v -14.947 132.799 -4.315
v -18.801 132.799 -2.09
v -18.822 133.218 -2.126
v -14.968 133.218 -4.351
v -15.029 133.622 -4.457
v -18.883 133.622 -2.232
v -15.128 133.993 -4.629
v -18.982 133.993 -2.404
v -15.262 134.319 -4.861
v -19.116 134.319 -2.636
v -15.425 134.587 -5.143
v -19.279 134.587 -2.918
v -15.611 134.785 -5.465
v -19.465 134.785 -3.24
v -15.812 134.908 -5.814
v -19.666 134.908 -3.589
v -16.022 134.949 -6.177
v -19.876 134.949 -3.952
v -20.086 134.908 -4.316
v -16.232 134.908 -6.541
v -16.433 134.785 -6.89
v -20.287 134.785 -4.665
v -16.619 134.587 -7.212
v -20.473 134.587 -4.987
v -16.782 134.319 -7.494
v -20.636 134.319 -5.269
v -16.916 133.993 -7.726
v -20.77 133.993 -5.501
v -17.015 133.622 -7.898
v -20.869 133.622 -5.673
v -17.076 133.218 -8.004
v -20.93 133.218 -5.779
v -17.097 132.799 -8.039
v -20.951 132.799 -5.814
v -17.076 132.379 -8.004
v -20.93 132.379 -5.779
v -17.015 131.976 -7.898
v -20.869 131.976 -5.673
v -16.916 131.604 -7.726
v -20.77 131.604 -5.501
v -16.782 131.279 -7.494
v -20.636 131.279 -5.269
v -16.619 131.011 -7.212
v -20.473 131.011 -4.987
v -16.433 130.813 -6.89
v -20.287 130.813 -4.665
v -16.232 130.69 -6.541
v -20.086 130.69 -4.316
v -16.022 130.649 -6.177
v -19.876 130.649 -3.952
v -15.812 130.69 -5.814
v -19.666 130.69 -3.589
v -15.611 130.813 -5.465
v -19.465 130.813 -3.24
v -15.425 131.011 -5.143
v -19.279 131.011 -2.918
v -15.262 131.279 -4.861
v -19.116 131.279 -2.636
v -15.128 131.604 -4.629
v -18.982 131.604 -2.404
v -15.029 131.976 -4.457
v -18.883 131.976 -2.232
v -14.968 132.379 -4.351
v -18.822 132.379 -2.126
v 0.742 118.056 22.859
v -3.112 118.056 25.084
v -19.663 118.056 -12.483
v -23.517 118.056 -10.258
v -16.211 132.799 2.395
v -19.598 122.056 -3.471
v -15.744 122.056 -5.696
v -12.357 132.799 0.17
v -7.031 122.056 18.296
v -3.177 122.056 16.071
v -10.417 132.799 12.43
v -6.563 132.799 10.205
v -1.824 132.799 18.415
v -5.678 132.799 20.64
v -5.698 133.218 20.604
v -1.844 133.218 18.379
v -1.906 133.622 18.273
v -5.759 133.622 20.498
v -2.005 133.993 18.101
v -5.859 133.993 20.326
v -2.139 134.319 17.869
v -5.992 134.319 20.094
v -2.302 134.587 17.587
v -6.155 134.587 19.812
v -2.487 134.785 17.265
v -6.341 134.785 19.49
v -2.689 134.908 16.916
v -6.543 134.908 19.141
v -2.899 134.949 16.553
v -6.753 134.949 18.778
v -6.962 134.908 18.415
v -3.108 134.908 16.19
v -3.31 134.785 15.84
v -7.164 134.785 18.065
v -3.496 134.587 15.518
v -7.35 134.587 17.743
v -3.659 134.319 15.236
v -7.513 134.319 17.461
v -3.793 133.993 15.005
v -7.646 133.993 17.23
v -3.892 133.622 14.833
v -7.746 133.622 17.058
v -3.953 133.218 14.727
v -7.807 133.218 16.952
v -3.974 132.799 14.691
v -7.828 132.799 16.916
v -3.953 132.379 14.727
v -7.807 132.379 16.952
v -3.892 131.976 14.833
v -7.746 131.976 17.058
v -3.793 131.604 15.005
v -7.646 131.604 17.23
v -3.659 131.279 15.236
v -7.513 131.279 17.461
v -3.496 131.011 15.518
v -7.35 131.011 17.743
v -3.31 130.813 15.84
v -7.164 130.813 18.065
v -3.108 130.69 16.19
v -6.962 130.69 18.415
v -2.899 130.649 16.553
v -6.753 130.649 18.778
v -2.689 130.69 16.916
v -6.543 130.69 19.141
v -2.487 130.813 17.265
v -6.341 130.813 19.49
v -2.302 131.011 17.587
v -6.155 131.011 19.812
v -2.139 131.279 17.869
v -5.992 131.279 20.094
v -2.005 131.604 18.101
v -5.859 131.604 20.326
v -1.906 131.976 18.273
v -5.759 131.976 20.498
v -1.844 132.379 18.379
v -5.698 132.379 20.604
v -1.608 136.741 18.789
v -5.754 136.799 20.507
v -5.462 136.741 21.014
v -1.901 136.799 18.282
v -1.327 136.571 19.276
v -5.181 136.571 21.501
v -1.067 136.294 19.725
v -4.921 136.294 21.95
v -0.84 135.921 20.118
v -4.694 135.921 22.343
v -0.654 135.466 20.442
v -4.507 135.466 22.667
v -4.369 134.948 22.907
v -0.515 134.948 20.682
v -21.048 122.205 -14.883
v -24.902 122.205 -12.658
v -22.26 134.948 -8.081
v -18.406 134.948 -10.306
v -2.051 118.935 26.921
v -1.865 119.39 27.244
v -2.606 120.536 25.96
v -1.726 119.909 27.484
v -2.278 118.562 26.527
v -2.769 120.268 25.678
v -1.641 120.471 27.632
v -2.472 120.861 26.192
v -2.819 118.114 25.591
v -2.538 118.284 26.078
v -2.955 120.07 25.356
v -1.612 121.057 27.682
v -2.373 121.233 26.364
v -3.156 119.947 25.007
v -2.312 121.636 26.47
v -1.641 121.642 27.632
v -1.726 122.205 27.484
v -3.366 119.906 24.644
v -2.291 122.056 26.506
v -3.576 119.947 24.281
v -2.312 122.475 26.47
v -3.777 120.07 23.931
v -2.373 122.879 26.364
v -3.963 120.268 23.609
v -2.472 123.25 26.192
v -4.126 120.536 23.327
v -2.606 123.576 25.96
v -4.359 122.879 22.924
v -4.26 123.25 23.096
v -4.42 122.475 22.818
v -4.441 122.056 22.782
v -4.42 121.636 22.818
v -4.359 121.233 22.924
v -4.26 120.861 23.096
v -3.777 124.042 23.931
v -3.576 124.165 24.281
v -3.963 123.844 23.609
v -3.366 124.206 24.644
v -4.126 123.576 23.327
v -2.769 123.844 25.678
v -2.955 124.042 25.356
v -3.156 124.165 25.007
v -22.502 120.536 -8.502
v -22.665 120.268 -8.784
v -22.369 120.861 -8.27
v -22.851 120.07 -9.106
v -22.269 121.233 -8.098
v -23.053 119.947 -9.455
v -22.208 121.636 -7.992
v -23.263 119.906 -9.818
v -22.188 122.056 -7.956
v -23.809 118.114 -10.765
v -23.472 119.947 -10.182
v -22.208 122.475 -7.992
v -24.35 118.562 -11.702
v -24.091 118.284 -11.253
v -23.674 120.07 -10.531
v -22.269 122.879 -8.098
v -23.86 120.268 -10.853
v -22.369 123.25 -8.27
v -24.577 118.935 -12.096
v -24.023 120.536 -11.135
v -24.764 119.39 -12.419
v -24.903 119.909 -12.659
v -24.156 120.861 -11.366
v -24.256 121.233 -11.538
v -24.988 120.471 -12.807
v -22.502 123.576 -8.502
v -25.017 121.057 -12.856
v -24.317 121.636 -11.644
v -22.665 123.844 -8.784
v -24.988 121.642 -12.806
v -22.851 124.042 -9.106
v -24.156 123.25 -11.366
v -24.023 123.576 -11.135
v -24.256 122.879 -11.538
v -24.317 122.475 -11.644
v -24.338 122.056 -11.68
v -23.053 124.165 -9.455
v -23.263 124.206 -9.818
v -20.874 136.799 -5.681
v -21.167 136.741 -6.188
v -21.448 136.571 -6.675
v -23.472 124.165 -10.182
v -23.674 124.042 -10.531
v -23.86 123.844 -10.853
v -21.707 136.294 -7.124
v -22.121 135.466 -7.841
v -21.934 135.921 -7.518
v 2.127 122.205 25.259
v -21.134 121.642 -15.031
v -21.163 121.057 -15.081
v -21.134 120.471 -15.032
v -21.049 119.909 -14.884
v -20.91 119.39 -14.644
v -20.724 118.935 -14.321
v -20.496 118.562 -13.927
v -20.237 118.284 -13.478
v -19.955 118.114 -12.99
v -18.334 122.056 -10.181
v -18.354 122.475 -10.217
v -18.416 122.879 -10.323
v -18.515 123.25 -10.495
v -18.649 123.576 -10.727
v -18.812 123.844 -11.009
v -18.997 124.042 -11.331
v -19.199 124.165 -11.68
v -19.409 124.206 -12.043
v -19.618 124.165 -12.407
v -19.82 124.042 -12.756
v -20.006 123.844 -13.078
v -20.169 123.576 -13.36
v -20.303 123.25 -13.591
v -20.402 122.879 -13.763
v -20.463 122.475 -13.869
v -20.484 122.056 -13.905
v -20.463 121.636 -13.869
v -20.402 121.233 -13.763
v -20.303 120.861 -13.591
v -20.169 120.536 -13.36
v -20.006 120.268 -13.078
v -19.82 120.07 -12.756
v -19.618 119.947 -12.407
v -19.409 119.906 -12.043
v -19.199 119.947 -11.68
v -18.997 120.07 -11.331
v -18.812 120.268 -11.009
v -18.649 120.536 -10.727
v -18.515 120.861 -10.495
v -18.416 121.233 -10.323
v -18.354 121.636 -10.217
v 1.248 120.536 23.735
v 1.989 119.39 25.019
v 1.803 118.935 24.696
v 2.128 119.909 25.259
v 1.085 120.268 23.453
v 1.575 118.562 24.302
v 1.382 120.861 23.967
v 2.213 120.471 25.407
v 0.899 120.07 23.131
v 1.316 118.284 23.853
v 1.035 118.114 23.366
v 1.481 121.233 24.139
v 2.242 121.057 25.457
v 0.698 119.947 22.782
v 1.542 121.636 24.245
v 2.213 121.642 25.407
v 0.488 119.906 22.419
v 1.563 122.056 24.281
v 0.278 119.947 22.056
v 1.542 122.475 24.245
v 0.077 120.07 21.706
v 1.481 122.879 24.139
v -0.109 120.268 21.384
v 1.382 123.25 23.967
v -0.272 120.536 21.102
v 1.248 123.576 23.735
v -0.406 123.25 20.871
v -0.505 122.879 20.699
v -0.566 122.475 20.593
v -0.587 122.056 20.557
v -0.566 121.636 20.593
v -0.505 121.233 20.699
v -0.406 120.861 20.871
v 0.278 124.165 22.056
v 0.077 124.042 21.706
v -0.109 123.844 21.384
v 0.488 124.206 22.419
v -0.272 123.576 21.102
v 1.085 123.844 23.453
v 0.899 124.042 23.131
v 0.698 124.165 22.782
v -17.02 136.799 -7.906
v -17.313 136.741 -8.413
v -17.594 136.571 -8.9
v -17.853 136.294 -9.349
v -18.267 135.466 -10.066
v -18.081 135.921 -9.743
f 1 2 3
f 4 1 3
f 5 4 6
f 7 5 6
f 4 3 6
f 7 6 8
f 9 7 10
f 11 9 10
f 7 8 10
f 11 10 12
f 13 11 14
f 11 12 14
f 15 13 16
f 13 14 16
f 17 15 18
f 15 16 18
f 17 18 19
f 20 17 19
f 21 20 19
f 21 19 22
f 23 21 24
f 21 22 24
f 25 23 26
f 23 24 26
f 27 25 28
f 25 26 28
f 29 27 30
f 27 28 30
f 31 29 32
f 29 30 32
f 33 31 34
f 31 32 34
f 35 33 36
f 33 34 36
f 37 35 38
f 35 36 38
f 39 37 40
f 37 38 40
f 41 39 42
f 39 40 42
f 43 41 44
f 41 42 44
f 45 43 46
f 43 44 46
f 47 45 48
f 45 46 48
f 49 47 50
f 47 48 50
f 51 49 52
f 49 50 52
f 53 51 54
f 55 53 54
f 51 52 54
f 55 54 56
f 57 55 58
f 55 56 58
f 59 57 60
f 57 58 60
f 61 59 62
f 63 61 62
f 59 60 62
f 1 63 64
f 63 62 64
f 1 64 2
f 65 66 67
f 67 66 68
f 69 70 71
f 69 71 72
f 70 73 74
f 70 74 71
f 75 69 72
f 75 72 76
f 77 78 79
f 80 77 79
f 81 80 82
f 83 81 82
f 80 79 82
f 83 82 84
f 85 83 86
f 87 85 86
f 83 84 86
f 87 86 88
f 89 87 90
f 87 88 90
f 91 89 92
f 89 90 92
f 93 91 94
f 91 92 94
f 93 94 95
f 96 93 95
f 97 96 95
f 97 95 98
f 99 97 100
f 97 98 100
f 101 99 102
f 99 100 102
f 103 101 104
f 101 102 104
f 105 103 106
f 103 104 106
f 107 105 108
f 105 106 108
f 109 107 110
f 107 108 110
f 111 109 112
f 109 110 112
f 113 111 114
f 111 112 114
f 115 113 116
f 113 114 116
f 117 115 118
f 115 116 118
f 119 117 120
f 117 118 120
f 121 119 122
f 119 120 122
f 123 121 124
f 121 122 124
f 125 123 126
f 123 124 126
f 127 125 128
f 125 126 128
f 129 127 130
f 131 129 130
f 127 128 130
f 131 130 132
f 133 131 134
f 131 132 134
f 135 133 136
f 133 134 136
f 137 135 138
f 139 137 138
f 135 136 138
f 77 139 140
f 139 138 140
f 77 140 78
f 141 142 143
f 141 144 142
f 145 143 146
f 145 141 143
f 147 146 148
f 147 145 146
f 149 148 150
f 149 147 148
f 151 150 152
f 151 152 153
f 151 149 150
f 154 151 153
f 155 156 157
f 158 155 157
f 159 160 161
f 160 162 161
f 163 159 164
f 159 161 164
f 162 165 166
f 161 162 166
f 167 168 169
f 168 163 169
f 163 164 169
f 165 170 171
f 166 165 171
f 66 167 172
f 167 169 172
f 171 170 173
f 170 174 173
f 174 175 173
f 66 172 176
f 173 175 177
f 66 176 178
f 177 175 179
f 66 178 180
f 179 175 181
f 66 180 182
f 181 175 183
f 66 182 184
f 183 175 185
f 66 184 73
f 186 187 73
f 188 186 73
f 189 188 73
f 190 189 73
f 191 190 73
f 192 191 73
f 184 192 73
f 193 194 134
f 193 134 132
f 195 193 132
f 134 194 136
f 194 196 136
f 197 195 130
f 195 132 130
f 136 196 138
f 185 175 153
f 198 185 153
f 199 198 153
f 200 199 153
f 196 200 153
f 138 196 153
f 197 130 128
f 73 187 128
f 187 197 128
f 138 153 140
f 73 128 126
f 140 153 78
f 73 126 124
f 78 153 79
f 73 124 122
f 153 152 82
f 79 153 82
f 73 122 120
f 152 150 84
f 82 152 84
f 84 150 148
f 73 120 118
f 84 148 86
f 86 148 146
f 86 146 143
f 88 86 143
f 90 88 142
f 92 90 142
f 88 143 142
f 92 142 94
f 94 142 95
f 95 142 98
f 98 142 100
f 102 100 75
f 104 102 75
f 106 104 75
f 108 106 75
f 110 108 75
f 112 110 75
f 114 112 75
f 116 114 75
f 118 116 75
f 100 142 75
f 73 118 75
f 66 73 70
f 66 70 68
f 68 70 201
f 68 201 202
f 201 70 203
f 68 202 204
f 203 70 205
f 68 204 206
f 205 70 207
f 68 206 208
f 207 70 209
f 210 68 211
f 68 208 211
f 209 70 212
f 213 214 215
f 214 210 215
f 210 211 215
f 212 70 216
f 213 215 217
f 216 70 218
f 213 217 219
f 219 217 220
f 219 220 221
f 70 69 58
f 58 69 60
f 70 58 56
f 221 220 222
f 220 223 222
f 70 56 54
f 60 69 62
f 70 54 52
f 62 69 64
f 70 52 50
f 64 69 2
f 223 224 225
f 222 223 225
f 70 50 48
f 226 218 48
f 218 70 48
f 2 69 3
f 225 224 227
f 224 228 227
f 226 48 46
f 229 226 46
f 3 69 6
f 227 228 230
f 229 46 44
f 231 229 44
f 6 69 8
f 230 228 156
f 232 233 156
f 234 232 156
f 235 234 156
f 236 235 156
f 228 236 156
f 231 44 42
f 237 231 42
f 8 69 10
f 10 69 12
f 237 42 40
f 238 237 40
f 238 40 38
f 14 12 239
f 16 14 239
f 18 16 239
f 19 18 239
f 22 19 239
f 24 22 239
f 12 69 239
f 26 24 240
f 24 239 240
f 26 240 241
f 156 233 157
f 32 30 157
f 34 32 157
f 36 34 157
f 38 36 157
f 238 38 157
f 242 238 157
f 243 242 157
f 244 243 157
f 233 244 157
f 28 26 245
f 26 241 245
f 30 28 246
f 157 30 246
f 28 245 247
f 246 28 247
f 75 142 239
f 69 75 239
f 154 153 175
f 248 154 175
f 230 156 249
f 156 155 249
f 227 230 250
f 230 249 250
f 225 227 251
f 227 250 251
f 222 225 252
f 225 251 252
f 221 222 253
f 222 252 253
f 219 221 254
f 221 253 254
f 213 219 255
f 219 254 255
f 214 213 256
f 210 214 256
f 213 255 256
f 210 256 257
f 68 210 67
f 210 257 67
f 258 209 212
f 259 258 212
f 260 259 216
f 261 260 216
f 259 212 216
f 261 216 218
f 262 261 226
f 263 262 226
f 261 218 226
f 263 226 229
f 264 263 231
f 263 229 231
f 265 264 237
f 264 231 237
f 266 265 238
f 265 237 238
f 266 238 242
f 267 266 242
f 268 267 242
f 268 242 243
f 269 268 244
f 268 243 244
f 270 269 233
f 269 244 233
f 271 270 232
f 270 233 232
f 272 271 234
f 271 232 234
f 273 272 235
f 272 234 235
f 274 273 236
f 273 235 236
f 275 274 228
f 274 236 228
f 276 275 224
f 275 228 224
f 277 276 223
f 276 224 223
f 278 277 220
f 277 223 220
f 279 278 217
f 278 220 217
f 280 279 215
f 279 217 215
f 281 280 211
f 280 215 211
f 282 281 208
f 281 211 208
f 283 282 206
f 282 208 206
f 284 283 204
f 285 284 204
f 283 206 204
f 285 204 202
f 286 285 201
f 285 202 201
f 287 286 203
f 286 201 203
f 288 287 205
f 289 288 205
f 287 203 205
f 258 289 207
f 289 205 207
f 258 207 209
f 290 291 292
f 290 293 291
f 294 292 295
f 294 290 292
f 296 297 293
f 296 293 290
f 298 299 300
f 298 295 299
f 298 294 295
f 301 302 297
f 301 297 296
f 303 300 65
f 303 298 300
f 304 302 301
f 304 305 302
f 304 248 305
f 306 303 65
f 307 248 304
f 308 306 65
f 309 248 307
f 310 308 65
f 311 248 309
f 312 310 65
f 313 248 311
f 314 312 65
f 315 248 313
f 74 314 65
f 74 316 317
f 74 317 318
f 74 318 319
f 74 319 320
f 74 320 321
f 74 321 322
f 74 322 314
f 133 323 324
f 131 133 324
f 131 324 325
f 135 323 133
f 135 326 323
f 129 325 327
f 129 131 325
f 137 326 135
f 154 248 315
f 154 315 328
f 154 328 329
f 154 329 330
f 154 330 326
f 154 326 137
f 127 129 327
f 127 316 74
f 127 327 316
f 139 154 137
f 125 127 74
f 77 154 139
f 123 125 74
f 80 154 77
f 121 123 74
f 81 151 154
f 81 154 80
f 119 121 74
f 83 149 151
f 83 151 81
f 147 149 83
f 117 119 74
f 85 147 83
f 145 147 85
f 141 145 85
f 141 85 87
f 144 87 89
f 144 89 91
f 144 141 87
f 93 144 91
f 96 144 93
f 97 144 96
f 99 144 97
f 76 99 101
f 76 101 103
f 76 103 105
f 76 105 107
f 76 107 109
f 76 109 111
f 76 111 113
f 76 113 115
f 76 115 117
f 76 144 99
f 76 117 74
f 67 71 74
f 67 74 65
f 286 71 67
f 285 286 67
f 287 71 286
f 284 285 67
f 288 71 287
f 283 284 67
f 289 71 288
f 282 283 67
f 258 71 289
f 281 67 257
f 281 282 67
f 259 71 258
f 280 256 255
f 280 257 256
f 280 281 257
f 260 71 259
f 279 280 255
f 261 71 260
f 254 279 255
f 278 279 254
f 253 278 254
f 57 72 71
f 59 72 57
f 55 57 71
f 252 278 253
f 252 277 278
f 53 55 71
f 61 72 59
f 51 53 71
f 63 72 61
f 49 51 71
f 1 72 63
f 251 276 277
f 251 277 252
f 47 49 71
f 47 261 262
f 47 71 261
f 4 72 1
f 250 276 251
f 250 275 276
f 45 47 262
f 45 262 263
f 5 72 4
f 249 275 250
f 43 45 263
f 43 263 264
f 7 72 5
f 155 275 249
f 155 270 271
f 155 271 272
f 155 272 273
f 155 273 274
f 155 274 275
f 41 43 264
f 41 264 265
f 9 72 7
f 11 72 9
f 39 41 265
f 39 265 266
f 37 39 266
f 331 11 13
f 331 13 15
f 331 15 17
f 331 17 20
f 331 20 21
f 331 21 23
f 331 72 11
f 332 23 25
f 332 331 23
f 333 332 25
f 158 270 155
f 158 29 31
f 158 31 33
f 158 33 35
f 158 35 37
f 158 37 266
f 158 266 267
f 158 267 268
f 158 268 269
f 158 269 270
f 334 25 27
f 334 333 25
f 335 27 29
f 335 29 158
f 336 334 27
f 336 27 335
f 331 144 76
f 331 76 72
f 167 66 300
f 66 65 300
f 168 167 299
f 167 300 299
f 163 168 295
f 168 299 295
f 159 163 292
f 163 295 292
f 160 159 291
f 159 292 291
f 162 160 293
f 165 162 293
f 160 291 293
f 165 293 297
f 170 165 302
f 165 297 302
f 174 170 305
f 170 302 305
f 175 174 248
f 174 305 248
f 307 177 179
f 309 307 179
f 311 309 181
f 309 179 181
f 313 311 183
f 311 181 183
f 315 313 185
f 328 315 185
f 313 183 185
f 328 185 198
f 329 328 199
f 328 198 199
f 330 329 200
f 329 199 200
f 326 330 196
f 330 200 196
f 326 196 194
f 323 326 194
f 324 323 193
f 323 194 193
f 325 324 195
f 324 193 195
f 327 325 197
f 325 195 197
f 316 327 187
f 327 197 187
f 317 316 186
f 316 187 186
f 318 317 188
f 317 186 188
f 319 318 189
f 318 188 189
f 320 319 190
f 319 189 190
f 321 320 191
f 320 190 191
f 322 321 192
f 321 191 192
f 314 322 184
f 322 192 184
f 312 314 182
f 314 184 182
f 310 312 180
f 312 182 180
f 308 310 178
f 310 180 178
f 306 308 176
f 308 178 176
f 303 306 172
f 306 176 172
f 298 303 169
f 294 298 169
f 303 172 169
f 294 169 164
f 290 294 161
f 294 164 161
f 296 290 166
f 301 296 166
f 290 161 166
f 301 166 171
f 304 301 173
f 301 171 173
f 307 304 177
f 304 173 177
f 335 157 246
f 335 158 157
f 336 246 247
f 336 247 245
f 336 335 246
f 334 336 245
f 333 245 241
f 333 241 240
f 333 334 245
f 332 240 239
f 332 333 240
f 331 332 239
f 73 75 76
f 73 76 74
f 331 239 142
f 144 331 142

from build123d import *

# Parameters (mm, degrees)
SKETCH1_R           = 2.15
BOSS_EXTRUDE1_DEPTH = 4.45
FILLET1_R           = 3


with BuildPart() as part:
    # Sketch1 → Boss-Extrude1 (new body)
    with BuildSketch(Plane(origin=(-13.195504222, 0, 7.618427915), x_dir=(0.5, 0, 0.866025404), z_dir=(-0.866025404, 0, 0.5))):
        Polygon((-25.134165871, 118.055853922), (-17.360832538, 136.798849573), (16.885834129, 136.798849573), (24.659167462, 118.055853922), align=None)
        with Locations((-13.360832538, 132.798849573)):
            Circle(SKETCH1_R, mode=Mode.SUBTRACT)
        with Locations((12.885834129, 132.798849573)):
            Circle(SKETCH1_R, mode=Mode.SUBTRACT)
        with Locations((19.659167462, 122.055853922)):
            Circle(SKETCH1_R, mode=Mode.SUBTRACT)
        with Locations((-20.134165871, 122.055853922)):
            Circle(SKETCH1_R, mode=Mode.SUBTRACT)
        Polygon((-12.804739093, 122.055853922), (-6.03140576, 132.798849573), (5.556407351, 132.798849573), (12.329740684, 122.055853922), align=None, mode=Mode.SUBTRACT)
    extrude(amount=-BOSS_EXTRUDE1_DEPTH)

    # Fillet1
    fillet1_edges = [part.edges().sort_by_distance(p)[0] for p in [
        (-23.835680634, 118.055853922, -15.260898232),
        (-19.949013967, 136.798849573, -8.528994094),
        (-2.825680634, 136.798849573, 21.129489235),
        (1.060986033, 118.055853922, 27.861393373),
    ]]
    fillet(fillet1_edges, radius=FILLET1_R)


solid = part.part
